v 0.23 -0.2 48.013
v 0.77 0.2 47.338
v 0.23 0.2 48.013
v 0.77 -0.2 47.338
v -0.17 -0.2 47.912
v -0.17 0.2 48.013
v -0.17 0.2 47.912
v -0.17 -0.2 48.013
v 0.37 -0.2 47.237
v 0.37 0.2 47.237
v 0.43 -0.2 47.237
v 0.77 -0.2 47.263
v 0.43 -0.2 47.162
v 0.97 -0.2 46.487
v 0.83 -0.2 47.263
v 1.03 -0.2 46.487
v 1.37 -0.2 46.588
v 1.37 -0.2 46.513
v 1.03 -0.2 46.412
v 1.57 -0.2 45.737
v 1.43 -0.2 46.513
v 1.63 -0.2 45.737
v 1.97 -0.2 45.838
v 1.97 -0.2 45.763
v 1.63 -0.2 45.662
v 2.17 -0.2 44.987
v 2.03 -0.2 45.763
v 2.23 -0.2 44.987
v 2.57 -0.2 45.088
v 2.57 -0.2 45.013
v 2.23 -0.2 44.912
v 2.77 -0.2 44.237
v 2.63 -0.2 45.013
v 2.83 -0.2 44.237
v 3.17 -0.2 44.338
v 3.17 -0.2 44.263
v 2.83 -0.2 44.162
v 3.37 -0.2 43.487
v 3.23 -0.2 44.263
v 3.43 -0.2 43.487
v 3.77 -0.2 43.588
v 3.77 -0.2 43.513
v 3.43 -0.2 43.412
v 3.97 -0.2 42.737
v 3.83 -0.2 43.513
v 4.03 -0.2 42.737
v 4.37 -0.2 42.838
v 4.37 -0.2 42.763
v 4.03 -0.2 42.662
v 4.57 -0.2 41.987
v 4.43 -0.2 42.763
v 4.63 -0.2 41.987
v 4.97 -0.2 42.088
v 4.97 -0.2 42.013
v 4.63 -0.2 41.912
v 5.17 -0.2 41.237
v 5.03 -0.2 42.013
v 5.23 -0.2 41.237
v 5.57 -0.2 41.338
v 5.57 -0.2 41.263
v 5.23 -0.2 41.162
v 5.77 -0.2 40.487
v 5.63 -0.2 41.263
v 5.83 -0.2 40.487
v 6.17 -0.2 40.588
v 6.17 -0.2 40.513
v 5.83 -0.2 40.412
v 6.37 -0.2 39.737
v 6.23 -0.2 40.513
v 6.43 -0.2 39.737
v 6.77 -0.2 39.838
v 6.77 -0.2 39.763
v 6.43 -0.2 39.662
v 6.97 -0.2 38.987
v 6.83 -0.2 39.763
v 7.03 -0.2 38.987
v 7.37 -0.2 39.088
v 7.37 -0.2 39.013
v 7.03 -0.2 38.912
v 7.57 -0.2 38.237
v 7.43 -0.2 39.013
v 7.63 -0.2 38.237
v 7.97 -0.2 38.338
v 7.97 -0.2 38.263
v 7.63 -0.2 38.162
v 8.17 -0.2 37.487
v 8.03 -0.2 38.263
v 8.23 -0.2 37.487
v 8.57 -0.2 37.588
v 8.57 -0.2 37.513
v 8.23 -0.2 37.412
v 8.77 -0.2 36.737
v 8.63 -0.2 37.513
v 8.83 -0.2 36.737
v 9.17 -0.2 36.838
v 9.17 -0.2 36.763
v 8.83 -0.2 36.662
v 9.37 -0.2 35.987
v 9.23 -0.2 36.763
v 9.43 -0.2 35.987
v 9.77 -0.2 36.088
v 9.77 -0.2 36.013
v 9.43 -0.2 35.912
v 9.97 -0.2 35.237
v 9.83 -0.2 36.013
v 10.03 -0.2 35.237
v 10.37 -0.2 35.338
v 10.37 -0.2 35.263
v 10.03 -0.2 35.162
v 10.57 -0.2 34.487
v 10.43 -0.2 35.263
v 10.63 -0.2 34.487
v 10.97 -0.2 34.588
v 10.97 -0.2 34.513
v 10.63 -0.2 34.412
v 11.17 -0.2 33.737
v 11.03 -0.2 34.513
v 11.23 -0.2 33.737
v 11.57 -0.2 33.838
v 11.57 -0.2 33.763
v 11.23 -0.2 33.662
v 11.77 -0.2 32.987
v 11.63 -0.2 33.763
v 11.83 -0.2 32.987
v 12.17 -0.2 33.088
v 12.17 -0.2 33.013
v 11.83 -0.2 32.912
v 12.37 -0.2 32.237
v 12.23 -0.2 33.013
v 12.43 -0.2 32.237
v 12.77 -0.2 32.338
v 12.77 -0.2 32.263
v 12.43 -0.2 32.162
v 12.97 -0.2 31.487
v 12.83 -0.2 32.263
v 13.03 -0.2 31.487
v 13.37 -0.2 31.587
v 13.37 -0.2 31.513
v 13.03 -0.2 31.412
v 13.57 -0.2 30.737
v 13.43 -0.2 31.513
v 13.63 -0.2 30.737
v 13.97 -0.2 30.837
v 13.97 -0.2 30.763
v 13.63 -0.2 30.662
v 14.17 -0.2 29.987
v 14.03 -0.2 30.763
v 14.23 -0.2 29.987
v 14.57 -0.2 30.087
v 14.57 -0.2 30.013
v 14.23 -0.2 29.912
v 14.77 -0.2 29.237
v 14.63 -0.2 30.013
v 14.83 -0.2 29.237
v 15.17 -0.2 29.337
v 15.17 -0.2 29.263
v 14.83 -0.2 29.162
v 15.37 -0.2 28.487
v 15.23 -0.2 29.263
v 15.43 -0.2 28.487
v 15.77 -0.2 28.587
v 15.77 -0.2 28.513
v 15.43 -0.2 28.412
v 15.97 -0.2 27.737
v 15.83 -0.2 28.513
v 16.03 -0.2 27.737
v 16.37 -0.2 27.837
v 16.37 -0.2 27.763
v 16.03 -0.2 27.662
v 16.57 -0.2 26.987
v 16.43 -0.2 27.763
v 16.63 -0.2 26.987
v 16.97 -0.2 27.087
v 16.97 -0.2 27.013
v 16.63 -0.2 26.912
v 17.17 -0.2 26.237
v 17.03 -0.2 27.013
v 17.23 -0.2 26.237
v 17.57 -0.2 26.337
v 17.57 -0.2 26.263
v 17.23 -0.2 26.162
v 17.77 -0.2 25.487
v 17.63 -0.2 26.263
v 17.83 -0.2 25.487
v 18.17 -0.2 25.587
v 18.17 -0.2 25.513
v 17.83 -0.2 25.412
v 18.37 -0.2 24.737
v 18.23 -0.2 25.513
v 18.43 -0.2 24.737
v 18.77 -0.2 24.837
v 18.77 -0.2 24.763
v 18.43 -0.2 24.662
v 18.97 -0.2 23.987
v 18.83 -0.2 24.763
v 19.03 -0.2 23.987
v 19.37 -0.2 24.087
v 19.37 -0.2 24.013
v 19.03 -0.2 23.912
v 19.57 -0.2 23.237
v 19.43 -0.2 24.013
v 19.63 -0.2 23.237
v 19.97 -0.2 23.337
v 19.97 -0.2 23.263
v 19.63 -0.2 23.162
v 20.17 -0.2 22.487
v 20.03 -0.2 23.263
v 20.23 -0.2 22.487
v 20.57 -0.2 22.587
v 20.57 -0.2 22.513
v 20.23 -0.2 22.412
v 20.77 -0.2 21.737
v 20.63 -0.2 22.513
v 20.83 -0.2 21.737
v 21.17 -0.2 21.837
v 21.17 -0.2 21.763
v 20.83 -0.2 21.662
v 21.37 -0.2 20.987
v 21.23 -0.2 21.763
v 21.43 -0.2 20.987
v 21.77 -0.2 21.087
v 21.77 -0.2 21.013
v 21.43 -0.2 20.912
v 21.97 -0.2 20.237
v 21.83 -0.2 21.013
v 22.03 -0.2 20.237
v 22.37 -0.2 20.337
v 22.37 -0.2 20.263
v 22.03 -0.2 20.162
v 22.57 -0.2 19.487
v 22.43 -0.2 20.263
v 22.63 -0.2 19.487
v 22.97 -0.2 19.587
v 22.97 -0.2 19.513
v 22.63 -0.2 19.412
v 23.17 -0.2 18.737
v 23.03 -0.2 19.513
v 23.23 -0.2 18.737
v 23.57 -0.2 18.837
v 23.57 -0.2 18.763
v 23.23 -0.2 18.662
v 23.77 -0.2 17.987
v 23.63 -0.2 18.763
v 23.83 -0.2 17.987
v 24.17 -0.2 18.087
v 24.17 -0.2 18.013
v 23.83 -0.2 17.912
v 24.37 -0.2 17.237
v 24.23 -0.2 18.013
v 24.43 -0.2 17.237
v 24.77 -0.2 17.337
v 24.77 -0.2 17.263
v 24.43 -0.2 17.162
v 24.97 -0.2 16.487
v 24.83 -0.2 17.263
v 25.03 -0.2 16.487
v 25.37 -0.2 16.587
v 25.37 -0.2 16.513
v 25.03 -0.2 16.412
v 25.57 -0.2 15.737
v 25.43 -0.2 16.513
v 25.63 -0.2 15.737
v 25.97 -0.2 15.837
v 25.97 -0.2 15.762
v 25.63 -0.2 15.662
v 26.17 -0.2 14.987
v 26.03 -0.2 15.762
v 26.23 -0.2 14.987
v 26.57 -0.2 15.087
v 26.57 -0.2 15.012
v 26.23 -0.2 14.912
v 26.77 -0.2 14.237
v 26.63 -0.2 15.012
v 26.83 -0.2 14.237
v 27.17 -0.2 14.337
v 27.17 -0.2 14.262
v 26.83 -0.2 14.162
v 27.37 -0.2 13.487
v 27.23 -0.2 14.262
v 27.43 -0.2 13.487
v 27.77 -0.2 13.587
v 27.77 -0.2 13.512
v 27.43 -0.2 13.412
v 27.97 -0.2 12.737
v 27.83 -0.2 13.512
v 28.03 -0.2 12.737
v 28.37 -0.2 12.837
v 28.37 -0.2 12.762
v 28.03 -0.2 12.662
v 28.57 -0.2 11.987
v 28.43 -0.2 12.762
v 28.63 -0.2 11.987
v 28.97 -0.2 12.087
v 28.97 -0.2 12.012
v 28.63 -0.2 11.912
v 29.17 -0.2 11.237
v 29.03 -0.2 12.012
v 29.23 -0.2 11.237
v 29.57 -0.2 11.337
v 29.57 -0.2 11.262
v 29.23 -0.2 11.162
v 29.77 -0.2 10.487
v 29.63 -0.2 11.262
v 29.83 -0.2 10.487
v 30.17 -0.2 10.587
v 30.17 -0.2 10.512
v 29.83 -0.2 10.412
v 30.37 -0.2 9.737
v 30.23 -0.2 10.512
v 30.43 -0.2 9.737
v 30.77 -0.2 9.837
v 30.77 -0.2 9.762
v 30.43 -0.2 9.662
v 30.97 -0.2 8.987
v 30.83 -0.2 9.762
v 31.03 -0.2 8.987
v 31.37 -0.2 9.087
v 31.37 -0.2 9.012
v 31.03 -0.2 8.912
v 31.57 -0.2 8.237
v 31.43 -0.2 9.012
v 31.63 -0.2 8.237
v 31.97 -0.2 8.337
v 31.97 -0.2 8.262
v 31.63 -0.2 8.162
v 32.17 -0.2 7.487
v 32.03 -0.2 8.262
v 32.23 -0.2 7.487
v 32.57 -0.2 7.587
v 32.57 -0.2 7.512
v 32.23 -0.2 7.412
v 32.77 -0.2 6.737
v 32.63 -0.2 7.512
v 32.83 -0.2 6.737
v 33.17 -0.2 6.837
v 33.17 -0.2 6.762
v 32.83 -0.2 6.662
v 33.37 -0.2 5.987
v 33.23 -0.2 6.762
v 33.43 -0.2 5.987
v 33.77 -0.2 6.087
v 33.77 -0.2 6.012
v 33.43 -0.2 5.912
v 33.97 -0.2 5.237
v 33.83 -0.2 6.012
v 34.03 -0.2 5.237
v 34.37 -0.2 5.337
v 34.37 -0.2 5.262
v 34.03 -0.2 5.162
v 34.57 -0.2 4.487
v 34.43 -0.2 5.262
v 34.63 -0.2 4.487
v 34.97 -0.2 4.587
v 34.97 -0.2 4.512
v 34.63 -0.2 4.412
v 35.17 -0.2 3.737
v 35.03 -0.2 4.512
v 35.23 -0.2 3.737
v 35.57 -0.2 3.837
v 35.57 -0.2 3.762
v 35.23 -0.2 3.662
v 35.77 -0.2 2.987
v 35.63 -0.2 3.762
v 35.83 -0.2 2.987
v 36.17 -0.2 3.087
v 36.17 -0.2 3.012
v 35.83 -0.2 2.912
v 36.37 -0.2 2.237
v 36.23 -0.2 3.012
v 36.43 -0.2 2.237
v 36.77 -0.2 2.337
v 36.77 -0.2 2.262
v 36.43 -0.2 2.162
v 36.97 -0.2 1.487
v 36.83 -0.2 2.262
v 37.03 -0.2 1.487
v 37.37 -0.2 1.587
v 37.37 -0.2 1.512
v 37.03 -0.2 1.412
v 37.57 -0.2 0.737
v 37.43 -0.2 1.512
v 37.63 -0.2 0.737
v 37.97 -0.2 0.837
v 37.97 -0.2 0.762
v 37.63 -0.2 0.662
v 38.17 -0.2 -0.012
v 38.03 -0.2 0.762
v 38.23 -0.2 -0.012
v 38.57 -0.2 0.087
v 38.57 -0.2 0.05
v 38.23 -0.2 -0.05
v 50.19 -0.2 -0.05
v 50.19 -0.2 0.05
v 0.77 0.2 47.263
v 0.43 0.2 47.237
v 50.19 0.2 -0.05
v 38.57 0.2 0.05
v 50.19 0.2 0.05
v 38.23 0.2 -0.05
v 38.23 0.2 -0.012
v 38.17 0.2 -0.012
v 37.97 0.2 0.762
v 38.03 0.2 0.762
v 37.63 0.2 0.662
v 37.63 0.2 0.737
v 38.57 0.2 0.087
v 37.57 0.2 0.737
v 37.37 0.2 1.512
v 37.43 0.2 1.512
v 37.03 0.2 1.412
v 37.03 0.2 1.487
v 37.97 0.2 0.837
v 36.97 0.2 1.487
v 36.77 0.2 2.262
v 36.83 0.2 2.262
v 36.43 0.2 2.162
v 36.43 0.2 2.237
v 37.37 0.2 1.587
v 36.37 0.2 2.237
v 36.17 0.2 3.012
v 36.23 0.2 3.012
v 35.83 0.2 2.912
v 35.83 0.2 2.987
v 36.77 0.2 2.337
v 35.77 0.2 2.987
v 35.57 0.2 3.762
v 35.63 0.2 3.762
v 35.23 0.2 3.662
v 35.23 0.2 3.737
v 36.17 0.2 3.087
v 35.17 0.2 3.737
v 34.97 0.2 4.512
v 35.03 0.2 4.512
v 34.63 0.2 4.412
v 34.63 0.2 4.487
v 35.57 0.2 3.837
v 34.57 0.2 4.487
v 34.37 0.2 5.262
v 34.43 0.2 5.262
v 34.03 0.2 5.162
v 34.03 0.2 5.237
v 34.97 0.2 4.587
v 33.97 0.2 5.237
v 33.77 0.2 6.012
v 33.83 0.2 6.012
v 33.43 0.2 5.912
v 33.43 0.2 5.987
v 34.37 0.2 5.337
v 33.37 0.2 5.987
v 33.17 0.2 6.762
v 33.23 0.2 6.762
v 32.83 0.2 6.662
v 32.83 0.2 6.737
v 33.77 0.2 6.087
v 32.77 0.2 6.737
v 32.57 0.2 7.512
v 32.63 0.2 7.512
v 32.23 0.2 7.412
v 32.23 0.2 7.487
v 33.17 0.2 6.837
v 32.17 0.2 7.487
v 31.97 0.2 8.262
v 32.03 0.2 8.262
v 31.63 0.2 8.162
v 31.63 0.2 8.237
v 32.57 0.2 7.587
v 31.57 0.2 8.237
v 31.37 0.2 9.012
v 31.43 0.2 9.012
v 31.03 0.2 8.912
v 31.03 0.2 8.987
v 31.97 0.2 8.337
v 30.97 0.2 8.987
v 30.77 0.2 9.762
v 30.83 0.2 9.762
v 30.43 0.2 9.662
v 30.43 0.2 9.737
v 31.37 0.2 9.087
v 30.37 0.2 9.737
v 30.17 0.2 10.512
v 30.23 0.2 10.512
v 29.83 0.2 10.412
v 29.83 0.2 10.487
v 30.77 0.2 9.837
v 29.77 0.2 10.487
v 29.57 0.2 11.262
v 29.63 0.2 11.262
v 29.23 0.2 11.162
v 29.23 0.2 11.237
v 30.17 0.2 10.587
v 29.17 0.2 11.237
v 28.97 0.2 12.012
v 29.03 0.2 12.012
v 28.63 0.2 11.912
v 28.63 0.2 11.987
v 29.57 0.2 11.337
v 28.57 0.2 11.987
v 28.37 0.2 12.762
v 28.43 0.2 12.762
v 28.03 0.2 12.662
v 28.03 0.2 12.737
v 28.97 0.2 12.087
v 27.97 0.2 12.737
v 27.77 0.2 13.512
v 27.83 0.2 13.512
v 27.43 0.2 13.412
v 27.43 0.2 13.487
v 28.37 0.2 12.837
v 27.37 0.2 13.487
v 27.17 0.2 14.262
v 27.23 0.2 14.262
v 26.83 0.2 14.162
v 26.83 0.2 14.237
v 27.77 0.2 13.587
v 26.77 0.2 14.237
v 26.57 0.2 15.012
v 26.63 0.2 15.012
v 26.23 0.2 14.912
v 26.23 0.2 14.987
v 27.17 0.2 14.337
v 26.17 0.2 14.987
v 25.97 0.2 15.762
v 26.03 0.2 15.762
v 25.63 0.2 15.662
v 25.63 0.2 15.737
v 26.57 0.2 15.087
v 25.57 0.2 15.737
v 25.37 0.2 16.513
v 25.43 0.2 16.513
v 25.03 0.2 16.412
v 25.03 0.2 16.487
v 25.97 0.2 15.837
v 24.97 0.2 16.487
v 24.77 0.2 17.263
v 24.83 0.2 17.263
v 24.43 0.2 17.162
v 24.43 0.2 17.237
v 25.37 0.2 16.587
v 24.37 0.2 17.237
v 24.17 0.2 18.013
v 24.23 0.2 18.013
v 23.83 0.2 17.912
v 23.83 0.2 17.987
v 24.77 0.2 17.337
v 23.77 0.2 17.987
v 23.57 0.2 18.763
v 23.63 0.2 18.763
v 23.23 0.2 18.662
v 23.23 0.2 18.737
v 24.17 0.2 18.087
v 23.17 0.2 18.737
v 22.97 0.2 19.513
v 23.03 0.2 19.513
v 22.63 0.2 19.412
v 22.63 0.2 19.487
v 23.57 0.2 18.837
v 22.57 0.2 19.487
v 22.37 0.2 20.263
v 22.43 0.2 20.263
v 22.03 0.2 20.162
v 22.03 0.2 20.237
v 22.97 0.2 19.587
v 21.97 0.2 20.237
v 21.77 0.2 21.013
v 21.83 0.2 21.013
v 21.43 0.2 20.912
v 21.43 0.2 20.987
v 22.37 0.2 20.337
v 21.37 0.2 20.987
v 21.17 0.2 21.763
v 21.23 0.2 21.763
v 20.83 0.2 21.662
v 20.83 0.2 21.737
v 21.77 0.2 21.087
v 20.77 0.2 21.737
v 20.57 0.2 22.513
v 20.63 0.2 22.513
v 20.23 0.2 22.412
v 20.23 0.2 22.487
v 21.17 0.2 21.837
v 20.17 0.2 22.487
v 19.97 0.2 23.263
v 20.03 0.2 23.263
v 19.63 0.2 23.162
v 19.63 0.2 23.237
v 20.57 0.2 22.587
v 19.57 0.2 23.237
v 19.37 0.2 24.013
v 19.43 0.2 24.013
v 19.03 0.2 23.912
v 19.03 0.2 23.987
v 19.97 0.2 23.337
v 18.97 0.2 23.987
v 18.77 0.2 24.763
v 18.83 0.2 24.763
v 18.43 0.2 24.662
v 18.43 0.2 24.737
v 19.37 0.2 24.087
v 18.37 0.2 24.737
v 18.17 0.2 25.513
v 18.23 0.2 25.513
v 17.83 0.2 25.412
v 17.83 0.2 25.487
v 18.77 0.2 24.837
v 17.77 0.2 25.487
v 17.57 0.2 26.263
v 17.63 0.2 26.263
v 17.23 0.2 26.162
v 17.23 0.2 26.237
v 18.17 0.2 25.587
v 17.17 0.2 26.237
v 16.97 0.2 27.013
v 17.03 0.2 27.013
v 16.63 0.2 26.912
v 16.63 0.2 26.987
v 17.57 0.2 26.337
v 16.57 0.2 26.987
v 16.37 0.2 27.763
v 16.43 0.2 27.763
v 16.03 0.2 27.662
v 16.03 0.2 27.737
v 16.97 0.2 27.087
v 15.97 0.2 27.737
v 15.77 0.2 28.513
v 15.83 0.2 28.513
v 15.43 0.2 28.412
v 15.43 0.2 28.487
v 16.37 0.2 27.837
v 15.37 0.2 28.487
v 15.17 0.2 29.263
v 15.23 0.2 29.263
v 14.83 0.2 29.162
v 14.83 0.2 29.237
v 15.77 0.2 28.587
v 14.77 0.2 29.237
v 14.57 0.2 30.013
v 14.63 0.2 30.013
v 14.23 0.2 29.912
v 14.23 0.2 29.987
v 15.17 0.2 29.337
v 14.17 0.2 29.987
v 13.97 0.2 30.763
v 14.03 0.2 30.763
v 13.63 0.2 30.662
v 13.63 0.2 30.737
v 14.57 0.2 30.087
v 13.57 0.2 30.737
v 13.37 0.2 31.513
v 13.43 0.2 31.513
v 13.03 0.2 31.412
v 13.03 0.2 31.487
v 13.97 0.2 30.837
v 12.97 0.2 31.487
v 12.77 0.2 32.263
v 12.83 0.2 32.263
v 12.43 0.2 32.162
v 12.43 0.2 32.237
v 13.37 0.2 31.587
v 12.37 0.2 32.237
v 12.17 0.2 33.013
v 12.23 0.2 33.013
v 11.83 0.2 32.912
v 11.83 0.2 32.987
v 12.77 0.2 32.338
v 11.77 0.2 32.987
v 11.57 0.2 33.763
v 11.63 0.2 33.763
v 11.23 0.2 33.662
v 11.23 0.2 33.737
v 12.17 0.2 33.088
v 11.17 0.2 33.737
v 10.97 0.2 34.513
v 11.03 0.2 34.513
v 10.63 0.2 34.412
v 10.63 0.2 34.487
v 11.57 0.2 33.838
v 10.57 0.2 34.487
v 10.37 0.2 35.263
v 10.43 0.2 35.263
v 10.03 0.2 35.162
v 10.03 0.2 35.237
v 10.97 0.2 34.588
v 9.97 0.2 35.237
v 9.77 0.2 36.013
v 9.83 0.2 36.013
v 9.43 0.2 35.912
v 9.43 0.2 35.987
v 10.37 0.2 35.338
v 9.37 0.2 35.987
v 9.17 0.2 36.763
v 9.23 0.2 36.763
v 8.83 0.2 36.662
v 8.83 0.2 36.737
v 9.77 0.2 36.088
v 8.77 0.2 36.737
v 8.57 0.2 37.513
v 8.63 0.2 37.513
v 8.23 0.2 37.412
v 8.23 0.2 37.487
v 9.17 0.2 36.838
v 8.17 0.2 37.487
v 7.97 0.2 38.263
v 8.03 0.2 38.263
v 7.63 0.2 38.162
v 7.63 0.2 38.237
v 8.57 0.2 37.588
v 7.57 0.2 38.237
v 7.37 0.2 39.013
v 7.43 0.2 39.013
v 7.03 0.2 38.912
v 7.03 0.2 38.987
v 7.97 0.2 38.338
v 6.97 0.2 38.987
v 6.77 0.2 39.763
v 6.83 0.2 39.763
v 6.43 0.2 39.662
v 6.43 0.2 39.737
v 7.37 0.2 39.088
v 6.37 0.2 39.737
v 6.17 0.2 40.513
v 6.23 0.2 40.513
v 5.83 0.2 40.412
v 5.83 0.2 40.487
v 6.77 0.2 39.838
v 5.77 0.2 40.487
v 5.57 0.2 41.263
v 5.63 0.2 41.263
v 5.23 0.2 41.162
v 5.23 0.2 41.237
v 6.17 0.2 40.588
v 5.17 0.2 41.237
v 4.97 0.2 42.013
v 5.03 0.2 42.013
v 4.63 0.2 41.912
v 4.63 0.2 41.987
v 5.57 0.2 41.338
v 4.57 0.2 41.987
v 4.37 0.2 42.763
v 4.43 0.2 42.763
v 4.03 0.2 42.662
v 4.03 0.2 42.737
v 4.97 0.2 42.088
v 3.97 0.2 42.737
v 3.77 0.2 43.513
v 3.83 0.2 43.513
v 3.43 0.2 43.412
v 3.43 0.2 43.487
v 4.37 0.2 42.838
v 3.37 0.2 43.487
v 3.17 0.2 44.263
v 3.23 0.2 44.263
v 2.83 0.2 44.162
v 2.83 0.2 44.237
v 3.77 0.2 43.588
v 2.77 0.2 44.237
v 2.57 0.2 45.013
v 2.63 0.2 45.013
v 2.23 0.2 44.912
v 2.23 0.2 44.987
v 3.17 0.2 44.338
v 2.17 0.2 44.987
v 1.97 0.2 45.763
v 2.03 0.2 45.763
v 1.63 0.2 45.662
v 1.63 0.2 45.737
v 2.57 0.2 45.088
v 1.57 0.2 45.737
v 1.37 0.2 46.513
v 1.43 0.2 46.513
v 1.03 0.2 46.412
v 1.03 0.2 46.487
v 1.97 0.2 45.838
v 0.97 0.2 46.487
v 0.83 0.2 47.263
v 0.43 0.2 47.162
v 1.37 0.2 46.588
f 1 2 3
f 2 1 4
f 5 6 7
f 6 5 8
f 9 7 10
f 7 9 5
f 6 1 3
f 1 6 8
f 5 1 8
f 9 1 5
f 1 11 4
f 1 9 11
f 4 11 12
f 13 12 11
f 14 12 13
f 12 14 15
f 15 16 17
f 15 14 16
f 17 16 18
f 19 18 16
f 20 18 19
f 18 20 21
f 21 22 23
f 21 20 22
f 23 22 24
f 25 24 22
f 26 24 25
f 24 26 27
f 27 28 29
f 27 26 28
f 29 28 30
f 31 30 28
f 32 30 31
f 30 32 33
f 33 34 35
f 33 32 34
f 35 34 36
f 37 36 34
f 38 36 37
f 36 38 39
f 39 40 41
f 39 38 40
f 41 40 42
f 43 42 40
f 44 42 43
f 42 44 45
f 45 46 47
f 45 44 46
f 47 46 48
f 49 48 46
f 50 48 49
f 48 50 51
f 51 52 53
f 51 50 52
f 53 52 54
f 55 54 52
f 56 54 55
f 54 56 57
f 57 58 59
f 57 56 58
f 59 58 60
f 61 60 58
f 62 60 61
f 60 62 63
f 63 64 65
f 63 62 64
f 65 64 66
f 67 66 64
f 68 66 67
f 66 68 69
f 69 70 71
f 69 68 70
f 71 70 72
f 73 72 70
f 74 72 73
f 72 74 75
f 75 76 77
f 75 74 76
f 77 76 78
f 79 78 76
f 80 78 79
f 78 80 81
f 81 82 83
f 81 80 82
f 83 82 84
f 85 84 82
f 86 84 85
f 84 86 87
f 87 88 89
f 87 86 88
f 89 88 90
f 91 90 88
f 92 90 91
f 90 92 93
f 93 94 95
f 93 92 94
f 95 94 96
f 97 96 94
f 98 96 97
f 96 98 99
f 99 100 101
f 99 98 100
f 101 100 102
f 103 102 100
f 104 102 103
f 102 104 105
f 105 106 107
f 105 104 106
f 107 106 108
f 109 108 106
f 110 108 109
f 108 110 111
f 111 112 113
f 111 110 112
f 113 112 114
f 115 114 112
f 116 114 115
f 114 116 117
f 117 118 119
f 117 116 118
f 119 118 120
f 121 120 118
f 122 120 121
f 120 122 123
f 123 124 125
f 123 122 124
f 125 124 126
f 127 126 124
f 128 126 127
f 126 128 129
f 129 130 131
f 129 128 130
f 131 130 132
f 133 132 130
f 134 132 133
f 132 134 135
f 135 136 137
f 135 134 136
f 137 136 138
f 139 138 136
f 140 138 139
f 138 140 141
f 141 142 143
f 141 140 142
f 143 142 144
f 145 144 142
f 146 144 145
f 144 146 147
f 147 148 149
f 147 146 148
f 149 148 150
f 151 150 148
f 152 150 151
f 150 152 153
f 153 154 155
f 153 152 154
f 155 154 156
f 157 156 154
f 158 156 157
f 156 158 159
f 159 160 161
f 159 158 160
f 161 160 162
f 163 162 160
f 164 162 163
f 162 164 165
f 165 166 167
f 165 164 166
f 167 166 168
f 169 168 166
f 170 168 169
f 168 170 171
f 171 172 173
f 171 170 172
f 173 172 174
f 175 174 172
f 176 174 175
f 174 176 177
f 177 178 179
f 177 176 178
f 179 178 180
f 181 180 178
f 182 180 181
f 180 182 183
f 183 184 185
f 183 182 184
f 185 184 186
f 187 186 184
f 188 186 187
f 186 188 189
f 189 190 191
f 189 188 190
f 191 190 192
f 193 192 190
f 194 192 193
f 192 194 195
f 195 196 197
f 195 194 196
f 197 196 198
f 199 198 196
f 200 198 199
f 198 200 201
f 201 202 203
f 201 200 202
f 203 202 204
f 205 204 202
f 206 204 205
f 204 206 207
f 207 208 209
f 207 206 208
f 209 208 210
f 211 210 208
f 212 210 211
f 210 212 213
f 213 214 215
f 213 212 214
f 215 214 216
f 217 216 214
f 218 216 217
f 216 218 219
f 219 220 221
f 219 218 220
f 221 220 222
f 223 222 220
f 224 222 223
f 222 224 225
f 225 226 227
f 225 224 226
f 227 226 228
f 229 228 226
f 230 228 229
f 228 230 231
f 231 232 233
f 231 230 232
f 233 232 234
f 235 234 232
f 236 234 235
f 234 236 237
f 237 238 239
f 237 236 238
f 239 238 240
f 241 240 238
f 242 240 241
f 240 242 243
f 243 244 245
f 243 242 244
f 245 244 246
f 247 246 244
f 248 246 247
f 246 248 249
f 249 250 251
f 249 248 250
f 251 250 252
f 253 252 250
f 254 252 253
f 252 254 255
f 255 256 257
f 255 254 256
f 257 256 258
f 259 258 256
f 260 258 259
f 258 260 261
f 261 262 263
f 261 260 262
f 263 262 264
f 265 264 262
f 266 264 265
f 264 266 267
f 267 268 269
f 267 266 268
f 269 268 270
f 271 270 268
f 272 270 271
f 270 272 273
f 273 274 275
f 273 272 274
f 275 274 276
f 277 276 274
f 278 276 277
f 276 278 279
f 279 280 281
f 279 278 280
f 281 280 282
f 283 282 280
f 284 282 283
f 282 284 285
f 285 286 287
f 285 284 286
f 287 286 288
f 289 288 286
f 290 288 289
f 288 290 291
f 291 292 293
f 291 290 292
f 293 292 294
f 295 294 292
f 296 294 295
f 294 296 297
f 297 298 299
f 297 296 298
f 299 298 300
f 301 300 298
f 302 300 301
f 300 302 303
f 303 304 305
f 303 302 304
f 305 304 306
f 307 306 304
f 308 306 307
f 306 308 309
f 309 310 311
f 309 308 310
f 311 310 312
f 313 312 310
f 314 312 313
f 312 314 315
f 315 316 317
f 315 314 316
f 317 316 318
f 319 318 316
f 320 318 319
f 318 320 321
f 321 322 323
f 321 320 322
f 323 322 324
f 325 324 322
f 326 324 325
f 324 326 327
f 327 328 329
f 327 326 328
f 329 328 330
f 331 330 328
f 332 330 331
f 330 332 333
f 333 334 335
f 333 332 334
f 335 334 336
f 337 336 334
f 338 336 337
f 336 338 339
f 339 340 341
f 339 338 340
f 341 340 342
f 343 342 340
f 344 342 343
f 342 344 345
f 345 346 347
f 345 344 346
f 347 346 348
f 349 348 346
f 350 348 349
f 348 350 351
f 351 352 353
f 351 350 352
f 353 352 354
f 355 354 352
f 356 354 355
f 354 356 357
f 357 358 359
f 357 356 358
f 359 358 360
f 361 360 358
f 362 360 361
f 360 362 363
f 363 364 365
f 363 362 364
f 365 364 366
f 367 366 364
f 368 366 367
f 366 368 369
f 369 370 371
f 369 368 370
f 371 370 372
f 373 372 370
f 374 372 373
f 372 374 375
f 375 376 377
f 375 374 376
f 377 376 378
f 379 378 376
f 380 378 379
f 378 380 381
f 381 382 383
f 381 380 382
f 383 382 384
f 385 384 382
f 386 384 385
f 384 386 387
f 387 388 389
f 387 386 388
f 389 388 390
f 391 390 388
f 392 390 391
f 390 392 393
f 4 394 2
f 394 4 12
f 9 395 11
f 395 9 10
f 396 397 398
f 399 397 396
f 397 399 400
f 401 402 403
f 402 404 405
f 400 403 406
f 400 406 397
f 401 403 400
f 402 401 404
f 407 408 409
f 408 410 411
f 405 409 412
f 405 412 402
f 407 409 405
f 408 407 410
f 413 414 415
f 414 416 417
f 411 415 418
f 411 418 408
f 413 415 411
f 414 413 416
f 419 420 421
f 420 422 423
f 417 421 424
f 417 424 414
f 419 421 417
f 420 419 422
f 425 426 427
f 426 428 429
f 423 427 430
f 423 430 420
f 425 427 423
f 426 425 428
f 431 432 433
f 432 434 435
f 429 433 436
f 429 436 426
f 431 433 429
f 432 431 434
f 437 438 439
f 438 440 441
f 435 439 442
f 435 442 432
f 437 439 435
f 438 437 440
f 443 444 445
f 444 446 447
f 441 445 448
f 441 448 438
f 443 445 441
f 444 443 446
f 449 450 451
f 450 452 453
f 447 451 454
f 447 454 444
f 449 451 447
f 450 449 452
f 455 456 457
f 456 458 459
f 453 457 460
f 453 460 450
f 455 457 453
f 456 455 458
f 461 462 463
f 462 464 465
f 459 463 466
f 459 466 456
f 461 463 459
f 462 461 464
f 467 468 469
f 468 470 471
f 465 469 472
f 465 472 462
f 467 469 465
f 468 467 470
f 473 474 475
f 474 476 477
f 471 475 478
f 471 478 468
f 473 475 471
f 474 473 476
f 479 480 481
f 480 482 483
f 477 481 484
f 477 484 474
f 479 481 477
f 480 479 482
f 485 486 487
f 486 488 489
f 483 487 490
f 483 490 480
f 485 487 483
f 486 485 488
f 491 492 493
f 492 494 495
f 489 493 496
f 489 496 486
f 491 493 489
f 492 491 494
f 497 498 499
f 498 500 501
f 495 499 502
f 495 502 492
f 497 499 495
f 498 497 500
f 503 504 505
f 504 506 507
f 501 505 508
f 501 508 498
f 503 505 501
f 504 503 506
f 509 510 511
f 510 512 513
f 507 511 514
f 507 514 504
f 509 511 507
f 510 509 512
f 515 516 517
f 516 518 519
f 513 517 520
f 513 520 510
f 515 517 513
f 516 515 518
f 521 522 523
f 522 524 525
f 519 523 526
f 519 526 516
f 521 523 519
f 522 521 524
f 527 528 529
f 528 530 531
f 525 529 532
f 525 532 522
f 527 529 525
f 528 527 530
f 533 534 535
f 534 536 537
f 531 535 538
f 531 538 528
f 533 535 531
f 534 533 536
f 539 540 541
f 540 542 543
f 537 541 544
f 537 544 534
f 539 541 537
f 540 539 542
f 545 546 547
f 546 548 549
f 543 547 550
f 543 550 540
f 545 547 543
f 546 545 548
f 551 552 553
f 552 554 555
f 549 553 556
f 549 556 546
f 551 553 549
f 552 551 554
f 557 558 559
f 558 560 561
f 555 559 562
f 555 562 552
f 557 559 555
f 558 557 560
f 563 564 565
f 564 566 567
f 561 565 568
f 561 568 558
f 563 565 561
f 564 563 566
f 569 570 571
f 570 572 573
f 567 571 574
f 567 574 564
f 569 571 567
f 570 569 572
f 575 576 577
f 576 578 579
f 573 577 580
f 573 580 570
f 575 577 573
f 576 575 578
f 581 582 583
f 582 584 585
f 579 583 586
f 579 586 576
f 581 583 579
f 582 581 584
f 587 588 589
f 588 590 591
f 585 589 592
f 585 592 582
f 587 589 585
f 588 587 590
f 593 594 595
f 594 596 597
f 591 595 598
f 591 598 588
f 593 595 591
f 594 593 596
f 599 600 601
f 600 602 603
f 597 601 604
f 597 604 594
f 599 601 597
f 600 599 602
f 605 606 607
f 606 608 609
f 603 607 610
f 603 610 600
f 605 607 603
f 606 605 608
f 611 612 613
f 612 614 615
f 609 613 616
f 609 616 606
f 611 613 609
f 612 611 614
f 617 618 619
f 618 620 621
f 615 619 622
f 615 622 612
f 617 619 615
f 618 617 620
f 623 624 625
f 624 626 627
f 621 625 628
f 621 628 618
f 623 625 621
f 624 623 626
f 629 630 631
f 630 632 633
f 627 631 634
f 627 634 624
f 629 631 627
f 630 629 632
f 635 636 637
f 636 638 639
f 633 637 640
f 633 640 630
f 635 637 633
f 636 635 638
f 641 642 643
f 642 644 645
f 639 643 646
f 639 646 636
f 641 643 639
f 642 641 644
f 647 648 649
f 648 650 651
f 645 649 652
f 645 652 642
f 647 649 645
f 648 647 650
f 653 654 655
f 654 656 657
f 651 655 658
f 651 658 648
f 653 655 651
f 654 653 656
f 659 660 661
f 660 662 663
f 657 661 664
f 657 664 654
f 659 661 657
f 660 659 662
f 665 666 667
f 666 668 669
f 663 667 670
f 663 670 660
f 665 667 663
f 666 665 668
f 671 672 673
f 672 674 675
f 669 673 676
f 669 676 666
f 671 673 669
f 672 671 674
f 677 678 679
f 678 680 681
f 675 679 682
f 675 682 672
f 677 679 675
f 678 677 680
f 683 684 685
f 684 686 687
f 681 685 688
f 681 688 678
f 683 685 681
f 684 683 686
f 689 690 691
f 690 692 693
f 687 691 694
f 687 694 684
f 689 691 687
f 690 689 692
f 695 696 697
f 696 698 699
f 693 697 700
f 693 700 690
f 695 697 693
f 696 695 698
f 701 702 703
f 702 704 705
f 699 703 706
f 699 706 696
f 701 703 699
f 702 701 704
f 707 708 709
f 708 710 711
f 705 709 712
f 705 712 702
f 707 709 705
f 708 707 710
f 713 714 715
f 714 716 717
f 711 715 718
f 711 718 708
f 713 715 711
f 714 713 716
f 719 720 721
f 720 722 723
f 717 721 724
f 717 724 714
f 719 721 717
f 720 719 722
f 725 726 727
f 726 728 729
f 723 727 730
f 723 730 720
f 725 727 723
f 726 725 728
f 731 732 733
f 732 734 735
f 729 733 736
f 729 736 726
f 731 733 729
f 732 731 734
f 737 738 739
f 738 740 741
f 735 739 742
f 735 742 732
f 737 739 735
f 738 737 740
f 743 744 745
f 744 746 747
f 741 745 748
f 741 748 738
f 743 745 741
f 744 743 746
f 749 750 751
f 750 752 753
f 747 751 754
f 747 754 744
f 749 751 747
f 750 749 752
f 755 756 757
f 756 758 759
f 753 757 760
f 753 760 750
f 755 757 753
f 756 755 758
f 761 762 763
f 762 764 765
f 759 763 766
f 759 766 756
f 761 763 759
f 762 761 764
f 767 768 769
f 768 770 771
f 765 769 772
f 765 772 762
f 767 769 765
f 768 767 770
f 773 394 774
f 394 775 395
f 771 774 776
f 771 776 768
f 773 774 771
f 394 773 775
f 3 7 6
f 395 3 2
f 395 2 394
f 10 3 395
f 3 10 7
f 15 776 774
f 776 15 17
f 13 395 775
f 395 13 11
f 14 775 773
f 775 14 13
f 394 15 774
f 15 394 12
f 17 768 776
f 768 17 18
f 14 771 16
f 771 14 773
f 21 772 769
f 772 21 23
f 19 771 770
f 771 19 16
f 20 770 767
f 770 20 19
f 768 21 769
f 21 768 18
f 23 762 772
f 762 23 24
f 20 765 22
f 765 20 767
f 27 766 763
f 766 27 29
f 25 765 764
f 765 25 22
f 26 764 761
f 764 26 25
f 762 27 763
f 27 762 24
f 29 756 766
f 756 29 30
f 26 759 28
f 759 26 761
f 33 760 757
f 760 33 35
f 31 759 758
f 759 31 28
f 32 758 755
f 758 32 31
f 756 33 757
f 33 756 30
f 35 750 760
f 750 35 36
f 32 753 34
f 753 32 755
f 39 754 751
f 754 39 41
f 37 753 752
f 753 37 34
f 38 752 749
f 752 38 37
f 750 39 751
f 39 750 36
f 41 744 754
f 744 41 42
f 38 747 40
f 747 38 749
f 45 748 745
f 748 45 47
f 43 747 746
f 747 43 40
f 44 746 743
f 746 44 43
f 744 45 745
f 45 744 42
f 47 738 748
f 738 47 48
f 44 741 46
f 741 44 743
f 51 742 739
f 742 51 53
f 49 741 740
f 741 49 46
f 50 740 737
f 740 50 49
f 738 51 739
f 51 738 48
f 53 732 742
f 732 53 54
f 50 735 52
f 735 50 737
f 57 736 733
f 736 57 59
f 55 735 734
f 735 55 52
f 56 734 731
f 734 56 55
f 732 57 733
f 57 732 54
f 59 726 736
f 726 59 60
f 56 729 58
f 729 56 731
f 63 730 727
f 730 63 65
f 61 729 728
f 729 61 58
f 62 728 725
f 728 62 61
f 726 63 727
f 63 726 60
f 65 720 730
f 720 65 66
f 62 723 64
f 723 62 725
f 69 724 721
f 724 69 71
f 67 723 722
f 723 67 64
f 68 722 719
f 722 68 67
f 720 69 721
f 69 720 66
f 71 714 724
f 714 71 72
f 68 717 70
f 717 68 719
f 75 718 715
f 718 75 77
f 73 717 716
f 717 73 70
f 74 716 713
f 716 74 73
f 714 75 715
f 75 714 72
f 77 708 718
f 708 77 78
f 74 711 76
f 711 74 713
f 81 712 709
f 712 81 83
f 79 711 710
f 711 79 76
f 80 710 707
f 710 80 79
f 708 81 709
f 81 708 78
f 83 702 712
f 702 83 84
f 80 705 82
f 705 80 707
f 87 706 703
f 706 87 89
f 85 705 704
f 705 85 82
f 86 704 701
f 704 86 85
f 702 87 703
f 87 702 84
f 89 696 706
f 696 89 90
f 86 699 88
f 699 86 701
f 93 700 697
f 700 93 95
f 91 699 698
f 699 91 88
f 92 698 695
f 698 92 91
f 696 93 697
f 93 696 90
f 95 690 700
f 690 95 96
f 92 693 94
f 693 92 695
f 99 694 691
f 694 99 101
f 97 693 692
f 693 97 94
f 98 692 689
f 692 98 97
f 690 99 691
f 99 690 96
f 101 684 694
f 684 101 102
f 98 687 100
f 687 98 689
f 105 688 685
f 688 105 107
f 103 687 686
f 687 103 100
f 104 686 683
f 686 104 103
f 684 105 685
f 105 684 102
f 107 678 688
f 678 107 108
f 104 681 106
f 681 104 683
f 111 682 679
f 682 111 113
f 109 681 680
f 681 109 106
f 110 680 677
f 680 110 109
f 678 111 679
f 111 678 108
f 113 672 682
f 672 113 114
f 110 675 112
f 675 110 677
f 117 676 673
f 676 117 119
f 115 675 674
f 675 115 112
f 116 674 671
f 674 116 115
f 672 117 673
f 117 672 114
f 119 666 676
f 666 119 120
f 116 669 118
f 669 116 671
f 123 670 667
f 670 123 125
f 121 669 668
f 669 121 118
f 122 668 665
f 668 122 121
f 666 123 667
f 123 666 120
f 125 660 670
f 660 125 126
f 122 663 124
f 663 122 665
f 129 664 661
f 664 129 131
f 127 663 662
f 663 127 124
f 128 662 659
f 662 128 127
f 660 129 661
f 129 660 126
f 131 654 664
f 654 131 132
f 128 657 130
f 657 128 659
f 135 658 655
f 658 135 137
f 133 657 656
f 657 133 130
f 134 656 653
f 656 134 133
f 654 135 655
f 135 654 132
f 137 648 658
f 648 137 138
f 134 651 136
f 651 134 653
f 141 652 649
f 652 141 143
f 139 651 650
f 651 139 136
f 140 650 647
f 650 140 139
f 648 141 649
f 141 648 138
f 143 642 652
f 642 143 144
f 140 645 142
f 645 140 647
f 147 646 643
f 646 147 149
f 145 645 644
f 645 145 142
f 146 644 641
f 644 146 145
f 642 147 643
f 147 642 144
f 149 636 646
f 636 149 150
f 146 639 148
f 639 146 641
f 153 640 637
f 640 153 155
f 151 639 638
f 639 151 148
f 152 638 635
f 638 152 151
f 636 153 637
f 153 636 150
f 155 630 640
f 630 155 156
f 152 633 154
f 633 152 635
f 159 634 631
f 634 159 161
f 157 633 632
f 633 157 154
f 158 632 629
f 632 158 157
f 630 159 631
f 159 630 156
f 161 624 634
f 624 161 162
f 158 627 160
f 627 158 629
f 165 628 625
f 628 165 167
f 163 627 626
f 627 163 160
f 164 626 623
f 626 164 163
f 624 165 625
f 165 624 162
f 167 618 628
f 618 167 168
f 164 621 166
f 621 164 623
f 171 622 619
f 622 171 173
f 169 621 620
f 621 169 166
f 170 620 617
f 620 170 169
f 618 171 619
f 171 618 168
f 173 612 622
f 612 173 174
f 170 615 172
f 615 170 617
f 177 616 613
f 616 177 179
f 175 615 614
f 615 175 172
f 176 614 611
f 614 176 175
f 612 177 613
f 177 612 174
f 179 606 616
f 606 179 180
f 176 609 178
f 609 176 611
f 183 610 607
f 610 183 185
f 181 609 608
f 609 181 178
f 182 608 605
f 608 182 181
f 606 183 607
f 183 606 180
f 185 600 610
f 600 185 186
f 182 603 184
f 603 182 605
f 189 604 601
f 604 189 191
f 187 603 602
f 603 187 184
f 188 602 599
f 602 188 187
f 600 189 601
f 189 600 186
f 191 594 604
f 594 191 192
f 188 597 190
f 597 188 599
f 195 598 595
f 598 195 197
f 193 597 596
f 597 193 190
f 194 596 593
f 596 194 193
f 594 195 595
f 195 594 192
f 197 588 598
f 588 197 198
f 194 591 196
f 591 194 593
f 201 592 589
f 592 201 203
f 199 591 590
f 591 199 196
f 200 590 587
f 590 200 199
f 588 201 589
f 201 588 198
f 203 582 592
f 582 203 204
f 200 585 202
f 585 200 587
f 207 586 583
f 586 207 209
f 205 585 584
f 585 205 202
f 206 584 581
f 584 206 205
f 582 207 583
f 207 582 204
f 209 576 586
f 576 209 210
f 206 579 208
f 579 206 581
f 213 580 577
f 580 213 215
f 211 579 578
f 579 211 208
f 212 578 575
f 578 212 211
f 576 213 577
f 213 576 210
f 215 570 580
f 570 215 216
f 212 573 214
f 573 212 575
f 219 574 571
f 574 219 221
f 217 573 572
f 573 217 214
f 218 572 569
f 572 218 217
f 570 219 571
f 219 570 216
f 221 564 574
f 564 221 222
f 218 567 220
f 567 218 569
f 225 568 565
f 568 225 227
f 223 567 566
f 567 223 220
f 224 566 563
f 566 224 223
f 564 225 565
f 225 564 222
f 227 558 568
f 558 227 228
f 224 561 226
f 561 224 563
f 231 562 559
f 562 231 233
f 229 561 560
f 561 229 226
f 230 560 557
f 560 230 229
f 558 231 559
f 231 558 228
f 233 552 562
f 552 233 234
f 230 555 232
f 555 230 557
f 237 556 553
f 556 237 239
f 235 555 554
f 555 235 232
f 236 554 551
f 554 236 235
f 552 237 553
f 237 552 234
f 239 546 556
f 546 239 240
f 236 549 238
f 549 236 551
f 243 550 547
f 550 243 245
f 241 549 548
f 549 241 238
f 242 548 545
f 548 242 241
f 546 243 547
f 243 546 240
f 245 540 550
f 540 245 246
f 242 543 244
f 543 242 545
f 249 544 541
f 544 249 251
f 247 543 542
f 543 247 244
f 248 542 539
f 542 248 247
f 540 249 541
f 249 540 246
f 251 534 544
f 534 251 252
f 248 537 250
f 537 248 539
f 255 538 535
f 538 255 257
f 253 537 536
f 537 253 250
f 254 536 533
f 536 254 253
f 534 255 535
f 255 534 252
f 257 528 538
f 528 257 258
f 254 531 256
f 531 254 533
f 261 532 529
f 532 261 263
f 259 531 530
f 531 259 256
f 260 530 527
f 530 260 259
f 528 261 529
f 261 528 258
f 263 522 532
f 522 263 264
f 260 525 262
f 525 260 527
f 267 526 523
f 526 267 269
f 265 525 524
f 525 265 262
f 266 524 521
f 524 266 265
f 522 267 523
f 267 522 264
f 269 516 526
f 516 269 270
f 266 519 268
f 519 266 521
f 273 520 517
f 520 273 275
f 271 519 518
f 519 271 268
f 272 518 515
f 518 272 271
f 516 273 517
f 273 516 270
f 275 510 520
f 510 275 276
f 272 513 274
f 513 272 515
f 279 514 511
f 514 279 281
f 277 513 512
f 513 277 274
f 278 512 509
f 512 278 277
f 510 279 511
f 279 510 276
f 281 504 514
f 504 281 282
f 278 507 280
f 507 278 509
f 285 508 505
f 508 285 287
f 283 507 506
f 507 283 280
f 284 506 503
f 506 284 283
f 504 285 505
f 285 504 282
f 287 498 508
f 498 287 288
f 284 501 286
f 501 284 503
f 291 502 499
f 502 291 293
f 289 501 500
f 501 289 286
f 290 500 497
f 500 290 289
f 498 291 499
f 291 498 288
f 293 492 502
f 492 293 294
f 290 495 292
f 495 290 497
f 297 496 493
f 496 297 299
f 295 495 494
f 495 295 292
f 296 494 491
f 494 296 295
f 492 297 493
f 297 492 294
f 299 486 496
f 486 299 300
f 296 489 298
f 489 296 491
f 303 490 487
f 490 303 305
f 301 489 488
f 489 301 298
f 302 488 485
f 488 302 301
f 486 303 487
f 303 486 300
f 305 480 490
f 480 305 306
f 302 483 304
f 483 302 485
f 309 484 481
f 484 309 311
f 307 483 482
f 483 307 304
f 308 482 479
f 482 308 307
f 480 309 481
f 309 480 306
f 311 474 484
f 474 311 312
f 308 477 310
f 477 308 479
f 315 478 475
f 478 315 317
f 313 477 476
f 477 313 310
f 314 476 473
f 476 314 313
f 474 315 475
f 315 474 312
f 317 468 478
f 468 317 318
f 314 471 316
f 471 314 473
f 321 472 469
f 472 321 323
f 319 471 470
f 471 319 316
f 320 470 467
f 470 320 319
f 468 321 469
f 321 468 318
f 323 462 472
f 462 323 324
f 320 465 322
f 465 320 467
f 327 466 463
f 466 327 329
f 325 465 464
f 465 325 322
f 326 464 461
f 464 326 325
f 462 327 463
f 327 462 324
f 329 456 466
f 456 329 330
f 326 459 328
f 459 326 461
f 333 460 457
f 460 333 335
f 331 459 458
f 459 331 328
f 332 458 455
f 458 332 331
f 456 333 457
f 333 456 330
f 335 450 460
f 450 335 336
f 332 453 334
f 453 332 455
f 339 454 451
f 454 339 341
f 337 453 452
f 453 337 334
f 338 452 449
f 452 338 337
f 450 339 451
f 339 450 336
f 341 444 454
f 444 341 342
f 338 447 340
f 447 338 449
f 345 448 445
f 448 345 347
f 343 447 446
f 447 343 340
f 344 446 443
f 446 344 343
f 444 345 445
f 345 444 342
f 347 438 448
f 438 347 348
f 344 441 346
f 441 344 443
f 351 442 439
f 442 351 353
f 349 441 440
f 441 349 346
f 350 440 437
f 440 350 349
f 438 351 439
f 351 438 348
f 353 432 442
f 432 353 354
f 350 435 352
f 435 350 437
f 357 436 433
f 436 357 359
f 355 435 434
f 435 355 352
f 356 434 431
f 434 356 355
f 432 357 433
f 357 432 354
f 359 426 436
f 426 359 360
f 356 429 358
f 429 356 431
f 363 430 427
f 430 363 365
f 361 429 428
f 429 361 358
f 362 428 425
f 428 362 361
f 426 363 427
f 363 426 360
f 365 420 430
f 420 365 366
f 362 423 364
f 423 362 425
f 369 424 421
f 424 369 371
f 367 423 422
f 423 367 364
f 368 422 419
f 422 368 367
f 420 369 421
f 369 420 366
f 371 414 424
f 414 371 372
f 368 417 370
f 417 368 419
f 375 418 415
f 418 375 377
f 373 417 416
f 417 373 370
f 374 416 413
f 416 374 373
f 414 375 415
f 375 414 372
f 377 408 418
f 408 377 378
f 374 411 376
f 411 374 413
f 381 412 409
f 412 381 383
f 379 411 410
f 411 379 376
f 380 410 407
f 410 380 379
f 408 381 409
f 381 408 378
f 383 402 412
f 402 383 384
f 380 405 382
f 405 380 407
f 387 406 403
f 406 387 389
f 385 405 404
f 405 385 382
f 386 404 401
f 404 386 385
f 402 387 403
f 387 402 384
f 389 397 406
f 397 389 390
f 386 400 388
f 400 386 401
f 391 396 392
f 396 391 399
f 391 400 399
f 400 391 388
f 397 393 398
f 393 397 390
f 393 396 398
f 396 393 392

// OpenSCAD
hull() {
    translate([0.03, 0.0, 47.962500000000006]) cube([0.4, 0.4, 0.1], center=true);
    translate([0.5700000000000001, 0.0, 47.2875]) cube([0.4, 0.4, 0.1], center=true);
}


hull() {
    translate([0.63, 0.0, 47.2125]) cube([0.4, 0.4, 0.1], center=true);
    translate([1.1700000000000002, 0.0, 46.5375]) cube([0.4, 0.4, 0.1], center=true);
}


hull() {
    translate([1.23, 0.0, 46.4625]) cube([0.4, 0.4, 0.1], center=true);
    translate([1.77, 0.0, 45.7875]) cube([0.4, 0.4, 0.1], center=true);
}


hull() {
    translate([1.83, 0.0, 45.712500000000006]) cube([0.4, 0.4, 0.1], center=true);
    translate([2.37, 0.0, 45.0375]) cube([0.4, 0.4, 0.1], center=true);
}


hull() {
    translate([2.43, 0.0, 44.9625]) cube([0.4, 0.4, 0.1], center=true);
    translate([2.97, 0.0, 44.2875]) cube([0.4, 0.4, 0.1], center=true);
}


hull() {
    translate([3.0300000000000002, 0.0, 44.212500000000006]) cube([0.4, 0.4, 0.1], center=true);
    translate([3.5700000000000003, 0.0, 43.5375]) cube([0.4, 0.4, 0.1], center=true);
}


hull() {
    translate([3.6300000000000003, 0.0, 43.4625]) cube([0.4, 0.4, 0.1], center=true);
    translate([4.17, 0.0, 42.7875]) cube([0.4, 0.4, 0.1], center=true);
}


hull() {
    translate([4.23, 0.0, 42.7125]) cube([0.4, 0.4, 0.1], center=true);
    translate([4.7700000000000005, 0.0, 42.0375]) cube([0.4, 0.4, 0.1], center=true);
}


hull() {
    translate([4.83, 0.0, 41.962500000000006]) cube([0.4, 0.4, 0.1], center=true);
    translate([5.37, 0.0, 41.2875]) cube([0.4, 0.4, 0.1], center=true);
}


hull() {
    translate([5.430000000000001, 0.0, 41.2125]) cube([0.4, 0.4, 0.1], center=true);
    translate([5.970000000000001, 0.0, 40.5375]) cube([0.4, 0.4, 0.1], center=true);
}


hull() {
    translate([6.03, 0.0, 40.462500000000006]) cube([0.4, 0.4, 0.1], center=true);
    translate([6.569999999999999, 0.0, 39.7875]) cube([0.4, 0.4, 0.1], center=true);
}


hull() {
    translate([6.63, 0.0, 39.7125]) cube([0.4, 0.4, 0.1], center=true);
    translate([7.170000000000001, 0.0, 39.0375]) cube([0.4, 0.4, 0.1], center=true);
}


hull() {
    translate([7.23, 0.0, 38.9625]) cube([0.4, 0.4, 0.1], center=true);
    translate([7.77, 0.0, 38.2875]) cube([0.4, 0.4, 0.1], center=true);
}


hull() {
    translate([7.83, 0.0, 38.212500000000006]) cube([0.4, 0.4, 0.1], center=true);
    translate([8.370000000000001, 0.0, 37.5375]) cube([0.4, 0.4, 0.1], center=true);
}


hull() {
    translate([8.43, 0.0, 37.4625]) cube([0.4, 0.4, 0.1], center=true);
    translate([8.969999999999999, 0.0, 36.7875]) cube([0.4, 0.4, 0.1], center=true);
}


hull() {
    translate([9.03, 0.0, 36.712500000000006]) cube([0.4, 0.4, 0.1], center=true);
    translate([9.57, 0.0, 36.0375]) cube([0.4, 0.4, 0.1], center=true);
}


hull() {
    translate([9.63, 0.0, 35.9625]) cube([0.4, 0.4, 0.1], center=true);
    translate([10.17, 0.0, 35.2875]) cube([0.4, 0.4, 0.1], center=true);
}


hull() {
    translate([10.23, 0.0, 35.2125]) cube([0.4, 0.4, 0.1], center=true);
    translate([10.770000000000001, 0.0, 34.5375]) cube([0.4, 0.4, 0.1], center=true);
}


hull() {
    translate([10.83, 0.0, 34.4625]) cube([0.4, 0.4, 0.1], center=true);
    translate([11.37, 0.0, 33.7875]) cube([0.4, 0.4, 0.1], center=true);
}


hull() {
    translate([11.43, 0.0, 33.7125]) cube([0.4, 0.4, 0.1], center=true);
    translate([11.97, 0.0, 33.0375]) cube([0.4, 0.4, 0.1], center=true);
}


hull() {
    translate([12.030000000000001, 0.0, 32.9625]) cube([0.4, 0.4, 0.1], center=true);
    translate([12.57, 0.0, 32.2875]) cube([0.4, 0.4, 0.1], center=true);
}


hull() {
    translate([12.629999999999999, 0.0, 32.212500000000006]) cube([0.4, 0.4, 0.1], center=true);
    translate([13.169999999999998, 0.0, 31.5375]) cube([0.4, 0.4, 0.1], center=true);
}


hull() {
    translate([13.229999999999999, 0.0, 31.462500000000002]) cube([0.4, 0.4, 0.1], center=true);
    translate([13.770000000000001, 0.0, 30.7875]) cube([0.4, 0.4, 0.1], center=true);
}


hull() {
    translate([13.830000000000002, 0.0, 30.712500000000002]) cube([0.4, 0.4, 0.1], center=true);
    translate([14.370000000000001, 0.0, 30.0375]) cube([0.4, 0.4, 0.1], center=true);
}


hull() {
    translate([14.430000000000001, 0.0, 29.9625]) cube([0.4, 0.4, 0.1], center=true);
    translate([14.97, 0.0, 29.2875]) cube([0.4, 0.4, 0.1], center=true);
}


hull() {
    translate([15.030000000000001, 0.0, 29.2125]) cube([0.4, 0.4, 0.1], center=true);
    translate([15.57, 0.0, 28.5375]) cube([0.4, 0.4, 0.1], center=true);
}


hull() {
    translate([15.629999999999999, 0.0, 28.462500000000002]) cube([0.4, 0.4, 0.1], center=true);
    translate([16.17, 0.0, 27.7875]) cube([0.4, 0.4, 0.1], center=true);
}


hull() {
    translate([16.23, 0.0, 27.712500000000002]) cube([0.4, 0.4, 0.1], center=true);
    translate([16.77, 0.0, 27.0375]) cube([0.4, 0.4, 0.1], center=true);
}


hull() {
    translate([16.830000000000002, 0.0, 26.962500000000002]) cube([0.4, 0.4, 0.1], center=true);
    translate([17.369999999999997, 0.0, 26.2875]) cube([0.4, 0.4, 0.1], center=true);
}


hull() {
    translate([17.43, 0.0, 26.2125]) cube([0.4, 0.4, 0.1], center=true);
    translate([17.97, 0.0, 25.5375]) cube([0.4, 0.4, 0.1], center=true);
}


hull() {
    translate([18.03, 0.0, 25.4625]) cube([0.4, 0.4, 0.1], center=true);
    translate([18.57, 0.0, 24.7875]) cube([0.4, 0.4, 0.1], center=true);
}


hull() {
    translate([18.630000000000003, 0.0, 24.712500000000002]) cube([0.4, 0.4, 0.1], center=true);
    translate([19.17, 0.0, 24.0375]) cube([0.4, 0.4, 0.1], center=true);
}


hull() {
    translate([19.23, 0.0, 23.962500000000002]) cube([0.4, 0.4, 0.1], center=true);
    translate([19.77, 0.0, 23.2875]) cube([0.4, 0.4, 0.1], center=true);
}


hull() {
    translate([19.830000000000002, 0.0, 23.212500000000002]) cube([0.4, 0.4, 0.1], center=true);
    translate([20.37, 0.0, 22.5375]) cube([0.4, 0.4, 0.1], center=true);
}


hull() {
    translate([20.43, 0.0, 22.4625]) cube([0.4, 0.4, 0.1], center=true);
    translate([20.970000000000002, 0.0, 21.787499999999998]) cube([0.4, 0.4, 0.1], center=true);
}


hull() {
    translate([21.03, 0.0, 21.7125]) cube([0.4, 0.4, 0.1], center=true);
    translate([21.57, 0.0, 21.0375]) cube([0.4, 0.4, 0.1], center=true);
}


hull() {
    translate([21.630000000000003, 0.0, 20.962500000000002]) cube([0.4, 0.4, 0.1], center=true);
    translate([22.17, 0.0, 20.2875]) cube([0.4, 0.4, 0.1], center=true);
}


hull() {
    translate([22.23, 0.0, 20.212500000000002]) cube([0.4, 0.4, 0.1], center=true);
    translate([22.77, 0.0, 19.5375]) cube([0.4, 0.4, 0.1], center=true);
}


hull() {
    translate([22.83, 0.0, 19.462500000000002]) cube([0.4, 0.4, 0.1], center=true);
    translate([23.369999999999997, 0.0, 18.7875]) cube([0.4, 0.4, 0.1], center=true);
}


hull() {
    translate([23.43, 0.0, 18.7125]) cube([0.4, 0.4, 0.1], center=true);
    translate([23.970000000000002, 0.0, 18.037499999999998]) cube([0.4, 0.4, 0.1], center=true);
}


hull() {
    translate([24.03, 0.0, 17.9625]) cube([0.4, 0.4, 0.1], center=true);
    translate([24.57, 0.0, 17.2875]) cube([0.4, 0.4, 0.1], center=true);
}


hull() {
    translate([24.630000000000003, 0.0, 17.2125]) cube([0.4, 0.4, 0.1], center=true);
    translate([25.17, 0.0, 16.5375]) cube([0.4, 0.4, 0.1], center=true);
}


hull() {
    translate([25.23, 0.0, 16.4625]) cube([0.4, 0.4, 0.1], center=true);
    translate([25.770000000000003, 0.0, 15.787500000000001]) cube([0.4, 0.4, 0.1], center=true);
}


hull() {
    translate([25.830000000000002, 0.0, 15.7125]) cube([0.4, 0.4, 0.1], center=true);
    translate([26.369999999999997, 0.0, 15.0375]) cube([0.4, 0.4, 0.1], center=true);
}


hull() {
    translate([26.43, 0.0, 14.9625]) cube([0.4, 0.4, 0.1], center=true);
    translate([26.97, 0.0, 14.287500000000001]) cube([0.4, 0.4, 0.1], center=true);
}


hull() {
    translate([27.03, 0.0, 14.212500000000002]) cube([0.4, 0.4, 0.1], center=true);
    translate([27.570000000000004, 0.0, 13.537500000000001]) cube([0.4, 0.4, 0.1], center=true);
}


hull() {
    translate([27.630000000000003, 0.0, 13.4625]) cube([0.4, 0.4, 0.1], center=true);
    translate([28.169999999999998, 0.0, 12.7875]) cube([0.4, 0.4, 0.1], center=true);
}


hull() {
    translate([28.23, 0.0, 12.7125]) cube([0.4, 0.4, 0.1], center=true);
    translate([28.770000000000003, 0.0, 12.037500000000001]) cube([0.4, 0.4, 0.1], center=true);
}


hull() {
    translate([28.830000000000002, 0.0, 11.9625]) cube([0.4, 0.4, 0.1], center=true);
    translate([29.37, 0.0, 11.2875]) cube([0.4, 0.4, 0.1], center=true);
}


hull() {
    translate([29.43, 0.0, 11.2125]) cube([0.4, 0.4, 0.1], center=true);
    translate([29.97, 0.0, 10.537500000000001]) cube([0.4, 0.4, 0.1], center=true);
}


hull() {
    translate([30.03, 0.0, 10.4625]) cube([0.4, 0.4, 0.1], center=true);
    translate([30.570000000000004, 0.0, 9.7875]) cube([0.4, 0.4, 0.1], center=true);
}


hull() {
    translate([30.630000000000003, 0.0, 9.7125]) cube([0.4, 0.4, 0.1], center=true);
    translate([31.169999999999998, 0.0, 9.0375]) cube([0.4, 0.4, 0.1], center=true);
}


hull() {
    translate([31.229999999999997, 0.0, 8.9625]) cube([0.4, 0.4, 0.1], center=true);
    translate([31.770000000000003, 0.0, 8.2875]) cube([0.4, 0.4, 0.1], center=true);
}


hull() {
    translate([31.830000000000002, 0.0, 8.2125]) cube([0.4, 0.4, 0.1], center=true);
    translate([32.37, 0.0, 7.5375]) cube([0.4, 0.4, 0.1], center=true);
}


hull() {
    translate([32.43, 0.0, 7.4625]) cube([0.4, 0.4, 0.1], center=true);
    translate([32.97, 0.0, 6.7875000000000005]) cube([0.4, 0.4, 0.1], center=true);
}


hull() {
    translate([33.03, 0.0, 6.7125]) cube([0.4, 0.4, 0.1], center=true);
    translate([33.57, 0.0, 6.0375000000000005]) cube([0.4, 0.4, 0.1], center=true);
}


hull() {
    translate([33.63, 0.0, 5.9625]) cube([0.4, 0.4, 0.1], center=true);
    translate([34.17, 0.0, 5.2875000000000005]) cube([0.4, 0.4, 0.1], center=true);
}


hull() {
    translate([34.230000000000004, 0.0, 5.2125]) cube([0.4, 0.4, 0.1], center=true);
    translate([34.769999999999996, 0.0, 4.5375]) cube([0.4, 0.4, 0.1], center=true);
}


hull() {
    translate([34.83, 0.0, 4.4624999999999995]) cube([0.4, 0.4, 0.1], center=true);
    translate([35.37, 0.0, 3.7875]) cube([0.4, 0.4, 0.1], center=true);
}


hull() {
    translate([35.43, 0.0, 3.7125]) cube([0.4, 0.4, 0.1], center=true);
    translate([35.97, 0.0, 3.0375]) cube([0.4, 0.4, 0.1], center=true);
}


hull() {
    translate([36.03, 0.0, 2.9625000000000004]) cube([0.4, 0.4, 0.1], center=true);
    translate([36.57000000000001, 0.0, 2.2875]) cube([0.4, 0.4, 0.1], center=true);
}


hull() {
    translate([36.63, 0.0, 2.2125]) cube([0.4, 0.4, 0.1], center=true);
    translate([37.17, 0.0, 1.5375]) cube([0.4, 0.4, 0.1], center=true);
}


hull() {
    translate([37.230000000000004, 0.0, 1.4625000000000001]) cube([0.4, 0.4, 0.1], center=true);
    translate([37.769999999999996, 0.0, 0.7875000000000001]) cube([0.4, 0.4, 0.1], center=true);
}


hull() {
    translate([37.83, 0.0, 0.7125]) cube([0.4, 0.4, 0.1], center=true);
    translate([38.370000000000005, 0.0, 0.037500000000000006]) cube([0.4, 0.4, 0.1], center=true);
}


hull() {
    translate([38.43, 0.0, 0.0]) cube([0.4, 0.4, 0.1], center=true);
    translate([38.97, 0.0, 0.0]) cube([0.4, 0.4, 0.1], center=true);
}


hull() {
    translate([39.03, 0.0, 0.0]) cube([0.4, 0.4, 0.1], center=true);
    translate([39.57, 0.0, 0.0]) cube([0.4, 0.4, 0.1], center=true);
}


hull() {
    translate([39.63, 0.0, 0.0]) cube([0.4, 0.4, 0.1], center=true);
    translate([40.17000000000001, 0.0, 0.0]) cube([0.4, 0.4, 0.1], center=true);
}


hull() {
    translate([40.230000000000004, 0.0, 0.0]) cube([0.4, 0.4, 0.1], center=true);
    translate([40.769999999999996, 0.0, 0.0]) cube([0.4, 0.4, 0.1], center=true);
}


hull() {
    translate([40.83, 0.0, 0.0]) cube([0.4, 0.4, 0.1], center=true);
    translate([41.37, 0.0, 0.0]) cube([0.4, 0.4, 0.1], center=true);
}


hull() {
    translate([41.43, 0.0, 0.0]) cube([0.4, 0.4, 0.1], center=true);
    translate([41.970000000000006, 0.0, 0.0]) cube([0.4, 0.4, 0.1], center=true);
}


hull() {
    translate([42.03, 0.0, 0.0]) cube([0.4, 0.4, 0.1], center=true);
    translate([42.57, 0.0, 0.0]) cube([0.4, 0.4, 0.1], center=true);
}


hull() {
    translate([42.63, 0.0, 0.0]) cube([0.4, 0.4, 0.1], center=true);
    translate([43.17, 0.0, 0.0]) cube([0.4, 0.4, 0.1], center=true);
}


hull() {
    translate([43.230000000000004, 0.0, 0.0]) cube([0.4, 0.4, 0.1], center=true);
    translate([43.77, 0.0, 0.0]) cube([0.4, 0.4, 0.1], center=true);
}


hull() {
    translate([43.83, 0.0, 0.0]) cube([0.4, 0.4, 0.1], center=true);
    translate([44.37, 0.0, 0.0]) cube([0.4, 0.4, 0.1], center=true);
}


hull() {
    translate([44.43, 0.0, 0.0]) cube([0.4, 0.4, 0.1], center=true);
    translate([44.97, 0.0, 0.0]) cube([0.4, 0.4, 0.1], center=true);
}


hull() {
    translate([45.03, 0.0, 0.0]) cube([0.4, 0.4, 0.1], center=true);
    translate([45.57, 0.0, 0.0]) cube([0.4, 0.4, 0.1], center=true);
}


hull() {
    translate([45.63, 0.0, 0.0]) cube([0.4, 0.4, 0.1], center=true);
    translate([46.17000000000001, 0.0, 0.0]) cube([0.4, 0.4, 0.1], center=true);
}


hull() {
    translate([46.230000000000004, 0.0, 0.0]) cube([0.4, 0.4, 0.1], center=true);
    translate([46.769999999999996, 0.0, 0.0]) cube([0.4, 0.4, 0.1], center=true);
}


hull() {
    translate([46.83, 0.0, 0.0]) cube([0.4, 0.4, 0.1], center=true);
    translate([47.37, 0.0, 0.0]) cube([0.4, 0.4, 0.1], center=true);
}


hull() {
    translate([47.43, 0.0, 0.0]) cube([0.4, 0.4, 0.1], center=true);
    translate([47.970000000000006, 0.0, 0.0]) cube([0.4, 0.4, 0.1], center=true);
}


hull() {
    translate([48.03, 0.0, 0.0]) cube([0.4, 0.4, 0.1], center=true);
    translate([48.57, 0.0, 0.0]) cube([0.4, 0.4, 0.1], center=true);
}


hull() {
    translate([48.63, 0.0, 0.0]) cube([0.4, 0.4, 0.1], center=true);
    translate([49.17, 0.0, 0.0]) cube([0.4, 0.4, 0.1], center=true);
}


hull() {
    translate([49.230000000000004, 0.0, 0.0]) cube([0.4, 0.4, 0.1], center=true);
    translate([49.77, 0.0, 0.0]) cube([0.4, 0.4, 0.1], center=true);
}


hull() {
    translate([49.81, 0.0, 0.0]) cube([0.4, 0.4, 0.1], center=true);
    translate([49.99, 0.0, 0.0]) cube([0.4, 0.4, 0.1], center=true);
}
